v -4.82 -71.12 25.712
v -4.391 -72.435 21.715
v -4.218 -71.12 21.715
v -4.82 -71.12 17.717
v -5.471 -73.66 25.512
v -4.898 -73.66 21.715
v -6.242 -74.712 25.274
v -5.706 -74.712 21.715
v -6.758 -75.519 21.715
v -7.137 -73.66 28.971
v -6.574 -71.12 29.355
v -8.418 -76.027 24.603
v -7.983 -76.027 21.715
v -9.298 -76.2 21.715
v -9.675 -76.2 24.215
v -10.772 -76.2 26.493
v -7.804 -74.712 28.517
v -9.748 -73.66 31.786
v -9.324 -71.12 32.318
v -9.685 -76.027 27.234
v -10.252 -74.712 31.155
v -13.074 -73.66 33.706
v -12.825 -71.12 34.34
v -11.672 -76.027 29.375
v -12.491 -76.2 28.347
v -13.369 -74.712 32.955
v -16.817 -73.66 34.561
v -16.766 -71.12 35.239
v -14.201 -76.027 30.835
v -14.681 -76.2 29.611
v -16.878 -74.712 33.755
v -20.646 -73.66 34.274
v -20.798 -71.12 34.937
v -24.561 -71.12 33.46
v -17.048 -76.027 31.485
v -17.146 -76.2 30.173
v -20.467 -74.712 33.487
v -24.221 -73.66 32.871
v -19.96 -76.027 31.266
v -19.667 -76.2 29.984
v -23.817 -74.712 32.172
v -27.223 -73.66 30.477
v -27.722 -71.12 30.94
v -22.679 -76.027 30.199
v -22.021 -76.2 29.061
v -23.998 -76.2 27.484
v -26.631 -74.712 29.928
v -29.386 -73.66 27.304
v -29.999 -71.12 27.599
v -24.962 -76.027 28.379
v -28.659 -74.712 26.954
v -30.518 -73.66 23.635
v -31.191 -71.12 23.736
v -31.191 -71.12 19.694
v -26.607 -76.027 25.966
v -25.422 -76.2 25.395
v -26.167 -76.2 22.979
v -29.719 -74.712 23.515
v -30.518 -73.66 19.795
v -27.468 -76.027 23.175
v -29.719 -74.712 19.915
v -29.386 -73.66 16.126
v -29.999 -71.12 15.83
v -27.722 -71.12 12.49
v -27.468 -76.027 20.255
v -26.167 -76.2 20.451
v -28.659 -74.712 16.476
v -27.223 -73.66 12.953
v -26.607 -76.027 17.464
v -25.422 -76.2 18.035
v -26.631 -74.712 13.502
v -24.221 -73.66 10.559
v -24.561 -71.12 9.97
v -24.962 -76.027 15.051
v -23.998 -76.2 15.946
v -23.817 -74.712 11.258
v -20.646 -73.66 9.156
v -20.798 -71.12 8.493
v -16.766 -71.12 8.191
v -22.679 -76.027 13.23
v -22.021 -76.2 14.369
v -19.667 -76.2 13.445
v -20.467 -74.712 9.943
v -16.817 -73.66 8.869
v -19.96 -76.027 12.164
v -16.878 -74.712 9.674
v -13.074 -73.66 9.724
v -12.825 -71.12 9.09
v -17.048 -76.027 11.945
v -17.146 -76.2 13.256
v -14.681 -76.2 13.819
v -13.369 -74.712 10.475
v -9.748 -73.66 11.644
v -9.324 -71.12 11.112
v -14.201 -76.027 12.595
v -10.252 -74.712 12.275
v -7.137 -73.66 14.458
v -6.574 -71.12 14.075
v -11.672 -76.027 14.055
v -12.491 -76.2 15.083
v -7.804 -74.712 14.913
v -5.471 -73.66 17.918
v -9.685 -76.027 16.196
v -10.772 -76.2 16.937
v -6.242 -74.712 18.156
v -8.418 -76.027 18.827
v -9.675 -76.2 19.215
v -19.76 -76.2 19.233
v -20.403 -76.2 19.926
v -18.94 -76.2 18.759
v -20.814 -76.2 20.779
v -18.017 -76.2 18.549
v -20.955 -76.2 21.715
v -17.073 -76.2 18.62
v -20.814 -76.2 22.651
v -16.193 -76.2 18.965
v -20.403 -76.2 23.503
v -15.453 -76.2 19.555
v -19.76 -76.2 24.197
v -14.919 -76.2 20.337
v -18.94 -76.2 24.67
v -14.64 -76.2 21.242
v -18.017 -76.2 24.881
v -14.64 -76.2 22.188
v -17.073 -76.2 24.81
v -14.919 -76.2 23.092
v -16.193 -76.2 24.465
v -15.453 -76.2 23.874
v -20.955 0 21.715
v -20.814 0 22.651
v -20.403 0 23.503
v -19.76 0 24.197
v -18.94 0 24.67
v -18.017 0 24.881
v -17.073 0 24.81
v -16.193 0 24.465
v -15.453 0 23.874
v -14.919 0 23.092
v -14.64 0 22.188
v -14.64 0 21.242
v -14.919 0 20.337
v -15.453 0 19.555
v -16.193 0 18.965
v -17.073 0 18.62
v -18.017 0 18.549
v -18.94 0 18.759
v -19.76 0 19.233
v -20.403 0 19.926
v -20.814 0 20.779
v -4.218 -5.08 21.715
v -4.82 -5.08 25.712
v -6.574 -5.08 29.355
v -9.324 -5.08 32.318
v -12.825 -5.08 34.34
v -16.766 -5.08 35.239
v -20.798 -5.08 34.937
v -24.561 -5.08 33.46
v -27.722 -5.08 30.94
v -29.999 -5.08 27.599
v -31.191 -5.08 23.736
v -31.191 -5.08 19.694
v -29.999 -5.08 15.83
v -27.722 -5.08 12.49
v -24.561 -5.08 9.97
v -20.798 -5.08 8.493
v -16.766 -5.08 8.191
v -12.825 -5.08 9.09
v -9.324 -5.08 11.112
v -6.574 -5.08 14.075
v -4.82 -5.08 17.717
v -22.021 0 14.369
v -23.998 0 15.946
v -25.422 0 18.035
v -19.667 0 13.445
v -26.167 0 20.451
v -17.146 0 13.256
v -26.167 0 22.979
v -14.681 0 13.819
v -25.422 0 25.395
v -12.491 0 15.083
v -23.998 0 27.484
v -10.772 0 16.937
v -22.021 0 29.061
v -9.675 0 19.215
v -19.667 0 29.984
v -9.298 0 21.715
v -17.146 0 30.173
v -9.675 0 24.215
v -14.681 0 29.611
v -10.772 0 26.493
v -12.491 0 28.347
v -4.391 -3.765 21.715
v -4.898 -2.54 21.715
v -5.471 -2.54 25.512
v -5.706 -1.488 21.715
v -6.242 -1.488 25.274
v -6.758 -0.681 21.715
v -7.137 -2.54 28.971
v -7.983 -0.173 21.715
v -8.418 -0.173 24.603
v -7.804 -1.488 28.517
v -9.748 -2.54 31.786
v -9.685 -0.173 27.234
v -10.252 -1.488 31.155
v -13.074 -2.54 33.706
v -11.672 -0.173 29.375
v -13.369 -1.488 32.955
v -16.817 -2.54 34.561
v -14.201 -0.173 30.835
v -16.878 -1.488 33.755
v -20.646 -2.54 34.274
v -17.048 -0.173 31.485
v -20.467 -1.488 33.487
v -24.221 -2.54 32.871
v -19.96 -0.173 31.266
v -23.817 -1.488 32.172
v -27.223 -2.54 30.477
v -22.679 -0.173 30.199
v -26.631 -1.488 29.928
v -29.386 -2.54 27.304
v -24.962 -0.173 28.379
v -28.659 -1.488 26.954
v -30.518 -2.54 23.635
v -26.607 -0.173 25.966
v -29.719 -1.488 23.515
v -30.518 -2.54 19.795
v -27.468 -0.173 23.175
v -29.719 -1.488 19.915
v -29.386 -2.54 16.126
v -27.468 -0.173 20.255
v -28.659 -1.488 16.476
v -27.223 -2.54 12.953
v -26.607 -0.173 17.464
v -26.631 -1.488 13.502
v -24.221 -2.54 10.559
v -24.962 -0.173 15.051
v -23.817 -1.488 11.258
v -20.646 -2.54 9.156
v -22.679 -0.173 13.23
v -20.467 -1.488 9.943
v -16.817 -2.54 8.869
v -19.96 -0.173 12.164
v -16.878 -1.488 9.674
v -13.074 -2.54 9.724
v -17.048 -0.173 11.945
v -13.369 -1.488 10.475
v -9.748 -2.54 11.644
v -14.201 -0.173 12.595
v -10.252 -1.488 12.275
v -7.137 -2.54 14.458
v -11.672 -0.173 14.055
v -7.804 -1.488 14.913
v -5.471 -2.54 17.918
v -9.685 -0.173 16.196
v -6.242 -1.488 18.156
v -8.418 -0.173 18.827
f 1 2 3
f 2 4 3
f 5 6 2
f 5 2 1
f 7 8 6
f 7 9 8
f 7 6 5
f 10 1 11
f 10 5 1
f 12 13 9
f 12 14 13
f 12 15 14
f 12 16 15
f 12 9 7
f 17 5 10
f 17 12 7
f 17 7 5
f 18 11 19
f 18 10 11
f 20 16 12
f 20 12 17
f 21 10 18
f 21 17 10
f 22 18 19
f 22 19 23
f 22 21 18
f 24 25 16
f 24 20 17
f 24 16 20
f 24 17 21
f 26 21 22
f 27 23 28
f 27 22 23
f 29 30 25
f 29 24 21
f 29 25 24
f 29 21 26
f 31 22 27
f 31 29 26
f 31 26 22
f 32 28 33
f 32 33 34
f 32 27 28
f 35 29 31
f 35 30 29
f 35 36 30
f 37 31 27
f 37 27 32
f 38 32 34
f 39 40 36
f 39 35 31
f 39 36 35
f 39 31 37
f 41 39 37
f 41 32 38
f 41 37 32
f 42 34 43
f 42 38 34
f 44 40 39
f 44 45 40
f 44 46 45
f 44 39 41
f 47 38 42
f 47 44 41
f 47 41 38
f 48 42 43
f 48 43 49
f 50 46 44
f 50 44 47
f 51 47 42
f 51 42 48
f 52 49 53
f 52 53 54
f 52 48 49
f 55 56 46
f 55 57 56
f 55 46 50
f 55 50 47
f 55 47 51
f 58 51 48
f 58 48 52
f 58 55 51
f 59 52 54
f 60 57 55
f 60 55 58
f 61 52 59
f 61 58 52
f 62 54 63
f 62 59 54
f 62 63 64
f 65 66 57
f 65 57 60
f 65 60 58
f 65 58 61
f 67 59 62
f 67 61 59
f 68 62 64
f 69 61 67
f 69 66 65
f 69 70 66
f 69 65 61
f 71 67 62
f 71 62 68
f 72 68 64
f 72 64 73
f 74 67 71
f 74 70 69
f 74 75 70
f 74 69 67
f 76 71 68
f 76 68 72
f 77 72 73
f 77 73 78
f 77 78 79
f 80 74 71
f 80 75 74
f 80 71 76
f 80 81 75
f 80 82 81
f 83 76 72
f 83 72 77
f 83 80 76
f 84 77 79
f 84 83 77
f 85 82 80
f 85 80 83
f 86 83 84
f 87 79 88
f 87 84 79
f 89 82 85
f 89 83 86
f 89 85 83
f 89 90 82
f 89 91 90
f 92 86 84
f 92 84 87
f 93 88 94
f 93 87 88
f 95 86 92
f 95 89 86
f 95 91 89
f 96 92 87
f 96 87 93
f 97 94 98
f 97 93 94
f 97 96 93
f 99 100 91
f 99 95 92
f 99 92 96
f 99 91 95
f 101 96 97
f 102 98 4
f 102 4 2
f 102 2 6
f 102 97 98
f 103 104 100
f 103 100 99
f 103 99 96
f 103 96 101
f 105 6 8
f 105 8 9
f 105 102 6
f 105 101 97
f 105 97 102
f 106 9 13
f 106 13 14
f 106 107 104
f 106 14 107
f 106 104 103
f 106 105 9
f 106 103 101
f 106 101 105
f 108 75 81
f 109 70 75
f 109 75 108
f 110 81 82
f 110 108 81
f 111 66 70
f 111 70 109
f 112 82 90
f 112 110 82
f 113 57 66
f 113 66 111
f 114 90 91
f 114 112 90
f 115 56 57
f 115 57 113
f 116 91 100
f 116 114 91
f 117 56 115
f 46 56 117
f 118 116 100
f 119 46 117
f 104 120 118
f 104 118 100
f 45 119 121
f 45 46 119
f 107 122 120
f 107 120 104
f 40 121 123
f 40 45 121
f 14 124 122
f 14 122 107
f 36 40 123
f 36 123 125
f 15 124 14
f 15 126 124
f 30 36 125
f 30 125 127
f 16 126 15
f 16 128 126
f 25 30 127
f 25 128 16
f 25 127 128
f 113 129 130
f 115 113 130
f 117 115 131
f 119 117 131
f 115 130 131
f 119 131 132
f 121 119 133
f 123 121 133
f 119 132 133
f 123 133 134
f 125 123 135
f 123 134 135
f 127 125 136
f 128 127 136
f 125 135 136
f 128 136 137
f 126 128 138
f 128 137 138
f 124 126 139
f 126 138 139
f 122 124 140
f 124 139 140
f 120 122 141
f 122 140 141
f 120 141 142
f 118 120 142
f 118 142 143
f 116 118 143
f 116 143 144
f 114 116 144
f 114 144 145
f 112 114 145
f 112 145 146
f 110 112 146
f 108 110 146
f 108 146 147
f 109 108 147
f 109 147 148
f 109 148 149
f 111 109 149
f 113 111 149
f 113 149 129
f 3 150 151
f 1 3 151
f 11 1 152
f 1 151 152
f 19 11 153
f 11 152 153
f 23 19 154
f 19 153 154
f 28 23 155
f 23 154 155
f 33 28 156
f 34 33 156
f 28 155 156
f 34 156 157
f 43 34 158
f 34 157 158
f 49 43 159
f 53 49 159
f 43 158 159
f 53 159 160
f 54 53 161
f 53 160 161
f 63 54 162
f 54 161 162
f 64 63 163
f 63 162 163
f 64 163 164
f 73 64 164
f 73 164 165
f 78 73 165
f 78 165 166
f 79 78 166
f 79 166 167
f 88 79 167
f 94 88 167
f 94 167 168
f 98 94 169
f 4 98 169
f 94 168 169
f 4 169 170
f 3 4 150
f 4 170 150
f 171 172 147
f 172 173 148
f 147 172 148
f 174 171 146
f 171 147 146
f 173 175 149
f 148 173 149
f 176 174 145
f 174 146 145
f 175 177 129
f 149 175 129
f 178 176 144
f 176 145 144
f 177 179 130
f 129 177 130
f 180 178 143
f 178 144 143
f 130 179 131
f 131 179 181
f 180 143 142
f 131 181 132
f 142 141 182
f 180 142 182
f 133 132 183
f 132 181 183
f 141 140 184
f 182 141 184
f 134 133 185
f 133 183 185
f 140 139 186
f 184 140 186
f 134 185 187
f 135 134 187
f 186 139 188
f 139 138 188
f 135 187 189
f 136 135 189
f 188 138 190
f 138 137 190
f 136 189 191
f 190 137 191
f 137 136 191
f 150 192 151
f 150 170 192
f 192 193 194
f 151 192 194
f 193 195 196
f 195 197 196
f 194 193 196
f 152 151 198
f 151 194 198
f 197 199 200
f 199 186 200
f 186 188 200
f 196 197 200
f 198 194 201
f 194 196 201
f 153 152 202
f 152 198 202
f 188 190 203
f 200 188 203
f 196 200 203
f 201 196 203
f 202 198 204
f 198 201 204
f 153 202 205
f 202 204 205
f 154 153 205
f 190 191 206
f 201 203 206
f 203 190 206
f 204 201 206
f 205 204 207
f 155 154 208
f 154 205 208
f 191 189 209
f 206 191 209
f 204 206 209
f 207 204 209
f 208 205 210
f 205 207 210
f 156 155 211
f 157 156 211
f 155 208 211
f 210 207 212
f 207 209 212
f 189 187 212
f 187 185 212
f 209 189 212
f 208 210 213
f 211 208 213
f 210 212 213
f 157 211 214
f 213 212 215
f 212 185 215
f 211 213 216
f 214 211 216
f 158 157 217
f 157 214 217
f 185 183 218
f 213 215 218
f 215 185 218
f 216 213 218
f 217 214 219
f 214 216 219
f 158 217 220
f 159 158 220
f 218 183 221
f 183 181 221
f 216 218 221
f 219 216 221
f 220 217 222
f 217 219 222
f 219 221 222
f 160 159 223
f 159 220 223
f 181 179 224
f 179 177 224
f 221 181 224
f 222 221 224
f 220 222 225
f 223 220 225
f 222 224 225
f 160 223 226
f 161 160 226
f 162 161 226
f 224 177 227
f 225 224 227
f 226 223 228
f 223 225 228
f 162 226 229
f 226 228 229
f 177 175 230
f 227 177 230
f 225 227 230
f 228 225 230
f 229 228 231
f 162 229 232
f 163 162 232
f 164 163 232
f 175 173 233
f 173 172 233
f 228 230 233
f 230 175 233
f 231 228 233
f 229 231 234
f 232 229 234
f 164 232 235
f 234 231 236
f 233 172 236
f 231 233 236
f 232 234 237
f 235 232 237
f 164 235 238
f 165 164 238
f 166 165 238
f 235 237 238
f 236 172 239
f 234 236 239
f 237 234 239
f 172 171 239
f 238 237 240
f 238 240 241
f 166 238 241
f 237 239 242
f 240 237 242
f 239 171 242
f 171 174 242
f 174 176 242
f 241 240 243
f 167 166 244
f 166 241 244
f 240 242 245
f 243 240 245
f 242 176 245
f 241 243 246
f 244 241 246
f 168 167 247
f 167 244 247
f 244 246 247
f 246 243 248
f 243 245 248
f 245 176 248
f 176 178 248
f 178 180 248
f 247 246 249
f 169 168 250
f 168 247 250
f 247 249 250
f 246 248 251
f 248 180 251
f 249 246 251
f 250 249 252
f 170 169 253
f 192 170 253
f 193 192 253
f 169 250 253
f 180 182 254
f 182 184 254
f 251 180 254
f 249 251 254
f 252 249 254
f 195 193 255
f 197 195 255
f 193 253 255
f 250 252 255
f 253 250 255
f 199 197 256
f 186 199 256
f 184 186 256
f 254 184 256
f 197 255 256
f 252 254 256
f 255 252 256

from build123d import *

# Parameters (mm, degrees)
F0_R     = 13.562221
F1_DEPTH = 76.2
F3_D     = 6.35
F4_R     = 5.08
F5_R     = 5.08


with BuildPart() as f1:
    # F0 (on Front) → F1 (new body)
    with BuildSketch(Plane.XZ):
        with Locations((-17.780002, 21.714916)):
            Circle(F0_R)
    extrude(amount=F1_DEPTH)

    # F3 (through all)
    with Locations(Plane.XZ.offset(76.2)):
        with Locations((-17.780002, 21.714916)):
            Hole(F3_D / 2)

    # F4
    f4_edges = [f1.edges().sort_by_distance(p)[0] for p in [
        (-31.342224, -76.2, 21.714916),
    ]]
    fillet(f4_edges, radius=F4_R)

    # F5
    f5_edges = [f1.edges().sort_by_distance(p)[0] for p in [
        (-31.342224, 0, 21.714916),
    ]]
    fillet(f5_edges, radius=F5_R)


solid = f1.part
